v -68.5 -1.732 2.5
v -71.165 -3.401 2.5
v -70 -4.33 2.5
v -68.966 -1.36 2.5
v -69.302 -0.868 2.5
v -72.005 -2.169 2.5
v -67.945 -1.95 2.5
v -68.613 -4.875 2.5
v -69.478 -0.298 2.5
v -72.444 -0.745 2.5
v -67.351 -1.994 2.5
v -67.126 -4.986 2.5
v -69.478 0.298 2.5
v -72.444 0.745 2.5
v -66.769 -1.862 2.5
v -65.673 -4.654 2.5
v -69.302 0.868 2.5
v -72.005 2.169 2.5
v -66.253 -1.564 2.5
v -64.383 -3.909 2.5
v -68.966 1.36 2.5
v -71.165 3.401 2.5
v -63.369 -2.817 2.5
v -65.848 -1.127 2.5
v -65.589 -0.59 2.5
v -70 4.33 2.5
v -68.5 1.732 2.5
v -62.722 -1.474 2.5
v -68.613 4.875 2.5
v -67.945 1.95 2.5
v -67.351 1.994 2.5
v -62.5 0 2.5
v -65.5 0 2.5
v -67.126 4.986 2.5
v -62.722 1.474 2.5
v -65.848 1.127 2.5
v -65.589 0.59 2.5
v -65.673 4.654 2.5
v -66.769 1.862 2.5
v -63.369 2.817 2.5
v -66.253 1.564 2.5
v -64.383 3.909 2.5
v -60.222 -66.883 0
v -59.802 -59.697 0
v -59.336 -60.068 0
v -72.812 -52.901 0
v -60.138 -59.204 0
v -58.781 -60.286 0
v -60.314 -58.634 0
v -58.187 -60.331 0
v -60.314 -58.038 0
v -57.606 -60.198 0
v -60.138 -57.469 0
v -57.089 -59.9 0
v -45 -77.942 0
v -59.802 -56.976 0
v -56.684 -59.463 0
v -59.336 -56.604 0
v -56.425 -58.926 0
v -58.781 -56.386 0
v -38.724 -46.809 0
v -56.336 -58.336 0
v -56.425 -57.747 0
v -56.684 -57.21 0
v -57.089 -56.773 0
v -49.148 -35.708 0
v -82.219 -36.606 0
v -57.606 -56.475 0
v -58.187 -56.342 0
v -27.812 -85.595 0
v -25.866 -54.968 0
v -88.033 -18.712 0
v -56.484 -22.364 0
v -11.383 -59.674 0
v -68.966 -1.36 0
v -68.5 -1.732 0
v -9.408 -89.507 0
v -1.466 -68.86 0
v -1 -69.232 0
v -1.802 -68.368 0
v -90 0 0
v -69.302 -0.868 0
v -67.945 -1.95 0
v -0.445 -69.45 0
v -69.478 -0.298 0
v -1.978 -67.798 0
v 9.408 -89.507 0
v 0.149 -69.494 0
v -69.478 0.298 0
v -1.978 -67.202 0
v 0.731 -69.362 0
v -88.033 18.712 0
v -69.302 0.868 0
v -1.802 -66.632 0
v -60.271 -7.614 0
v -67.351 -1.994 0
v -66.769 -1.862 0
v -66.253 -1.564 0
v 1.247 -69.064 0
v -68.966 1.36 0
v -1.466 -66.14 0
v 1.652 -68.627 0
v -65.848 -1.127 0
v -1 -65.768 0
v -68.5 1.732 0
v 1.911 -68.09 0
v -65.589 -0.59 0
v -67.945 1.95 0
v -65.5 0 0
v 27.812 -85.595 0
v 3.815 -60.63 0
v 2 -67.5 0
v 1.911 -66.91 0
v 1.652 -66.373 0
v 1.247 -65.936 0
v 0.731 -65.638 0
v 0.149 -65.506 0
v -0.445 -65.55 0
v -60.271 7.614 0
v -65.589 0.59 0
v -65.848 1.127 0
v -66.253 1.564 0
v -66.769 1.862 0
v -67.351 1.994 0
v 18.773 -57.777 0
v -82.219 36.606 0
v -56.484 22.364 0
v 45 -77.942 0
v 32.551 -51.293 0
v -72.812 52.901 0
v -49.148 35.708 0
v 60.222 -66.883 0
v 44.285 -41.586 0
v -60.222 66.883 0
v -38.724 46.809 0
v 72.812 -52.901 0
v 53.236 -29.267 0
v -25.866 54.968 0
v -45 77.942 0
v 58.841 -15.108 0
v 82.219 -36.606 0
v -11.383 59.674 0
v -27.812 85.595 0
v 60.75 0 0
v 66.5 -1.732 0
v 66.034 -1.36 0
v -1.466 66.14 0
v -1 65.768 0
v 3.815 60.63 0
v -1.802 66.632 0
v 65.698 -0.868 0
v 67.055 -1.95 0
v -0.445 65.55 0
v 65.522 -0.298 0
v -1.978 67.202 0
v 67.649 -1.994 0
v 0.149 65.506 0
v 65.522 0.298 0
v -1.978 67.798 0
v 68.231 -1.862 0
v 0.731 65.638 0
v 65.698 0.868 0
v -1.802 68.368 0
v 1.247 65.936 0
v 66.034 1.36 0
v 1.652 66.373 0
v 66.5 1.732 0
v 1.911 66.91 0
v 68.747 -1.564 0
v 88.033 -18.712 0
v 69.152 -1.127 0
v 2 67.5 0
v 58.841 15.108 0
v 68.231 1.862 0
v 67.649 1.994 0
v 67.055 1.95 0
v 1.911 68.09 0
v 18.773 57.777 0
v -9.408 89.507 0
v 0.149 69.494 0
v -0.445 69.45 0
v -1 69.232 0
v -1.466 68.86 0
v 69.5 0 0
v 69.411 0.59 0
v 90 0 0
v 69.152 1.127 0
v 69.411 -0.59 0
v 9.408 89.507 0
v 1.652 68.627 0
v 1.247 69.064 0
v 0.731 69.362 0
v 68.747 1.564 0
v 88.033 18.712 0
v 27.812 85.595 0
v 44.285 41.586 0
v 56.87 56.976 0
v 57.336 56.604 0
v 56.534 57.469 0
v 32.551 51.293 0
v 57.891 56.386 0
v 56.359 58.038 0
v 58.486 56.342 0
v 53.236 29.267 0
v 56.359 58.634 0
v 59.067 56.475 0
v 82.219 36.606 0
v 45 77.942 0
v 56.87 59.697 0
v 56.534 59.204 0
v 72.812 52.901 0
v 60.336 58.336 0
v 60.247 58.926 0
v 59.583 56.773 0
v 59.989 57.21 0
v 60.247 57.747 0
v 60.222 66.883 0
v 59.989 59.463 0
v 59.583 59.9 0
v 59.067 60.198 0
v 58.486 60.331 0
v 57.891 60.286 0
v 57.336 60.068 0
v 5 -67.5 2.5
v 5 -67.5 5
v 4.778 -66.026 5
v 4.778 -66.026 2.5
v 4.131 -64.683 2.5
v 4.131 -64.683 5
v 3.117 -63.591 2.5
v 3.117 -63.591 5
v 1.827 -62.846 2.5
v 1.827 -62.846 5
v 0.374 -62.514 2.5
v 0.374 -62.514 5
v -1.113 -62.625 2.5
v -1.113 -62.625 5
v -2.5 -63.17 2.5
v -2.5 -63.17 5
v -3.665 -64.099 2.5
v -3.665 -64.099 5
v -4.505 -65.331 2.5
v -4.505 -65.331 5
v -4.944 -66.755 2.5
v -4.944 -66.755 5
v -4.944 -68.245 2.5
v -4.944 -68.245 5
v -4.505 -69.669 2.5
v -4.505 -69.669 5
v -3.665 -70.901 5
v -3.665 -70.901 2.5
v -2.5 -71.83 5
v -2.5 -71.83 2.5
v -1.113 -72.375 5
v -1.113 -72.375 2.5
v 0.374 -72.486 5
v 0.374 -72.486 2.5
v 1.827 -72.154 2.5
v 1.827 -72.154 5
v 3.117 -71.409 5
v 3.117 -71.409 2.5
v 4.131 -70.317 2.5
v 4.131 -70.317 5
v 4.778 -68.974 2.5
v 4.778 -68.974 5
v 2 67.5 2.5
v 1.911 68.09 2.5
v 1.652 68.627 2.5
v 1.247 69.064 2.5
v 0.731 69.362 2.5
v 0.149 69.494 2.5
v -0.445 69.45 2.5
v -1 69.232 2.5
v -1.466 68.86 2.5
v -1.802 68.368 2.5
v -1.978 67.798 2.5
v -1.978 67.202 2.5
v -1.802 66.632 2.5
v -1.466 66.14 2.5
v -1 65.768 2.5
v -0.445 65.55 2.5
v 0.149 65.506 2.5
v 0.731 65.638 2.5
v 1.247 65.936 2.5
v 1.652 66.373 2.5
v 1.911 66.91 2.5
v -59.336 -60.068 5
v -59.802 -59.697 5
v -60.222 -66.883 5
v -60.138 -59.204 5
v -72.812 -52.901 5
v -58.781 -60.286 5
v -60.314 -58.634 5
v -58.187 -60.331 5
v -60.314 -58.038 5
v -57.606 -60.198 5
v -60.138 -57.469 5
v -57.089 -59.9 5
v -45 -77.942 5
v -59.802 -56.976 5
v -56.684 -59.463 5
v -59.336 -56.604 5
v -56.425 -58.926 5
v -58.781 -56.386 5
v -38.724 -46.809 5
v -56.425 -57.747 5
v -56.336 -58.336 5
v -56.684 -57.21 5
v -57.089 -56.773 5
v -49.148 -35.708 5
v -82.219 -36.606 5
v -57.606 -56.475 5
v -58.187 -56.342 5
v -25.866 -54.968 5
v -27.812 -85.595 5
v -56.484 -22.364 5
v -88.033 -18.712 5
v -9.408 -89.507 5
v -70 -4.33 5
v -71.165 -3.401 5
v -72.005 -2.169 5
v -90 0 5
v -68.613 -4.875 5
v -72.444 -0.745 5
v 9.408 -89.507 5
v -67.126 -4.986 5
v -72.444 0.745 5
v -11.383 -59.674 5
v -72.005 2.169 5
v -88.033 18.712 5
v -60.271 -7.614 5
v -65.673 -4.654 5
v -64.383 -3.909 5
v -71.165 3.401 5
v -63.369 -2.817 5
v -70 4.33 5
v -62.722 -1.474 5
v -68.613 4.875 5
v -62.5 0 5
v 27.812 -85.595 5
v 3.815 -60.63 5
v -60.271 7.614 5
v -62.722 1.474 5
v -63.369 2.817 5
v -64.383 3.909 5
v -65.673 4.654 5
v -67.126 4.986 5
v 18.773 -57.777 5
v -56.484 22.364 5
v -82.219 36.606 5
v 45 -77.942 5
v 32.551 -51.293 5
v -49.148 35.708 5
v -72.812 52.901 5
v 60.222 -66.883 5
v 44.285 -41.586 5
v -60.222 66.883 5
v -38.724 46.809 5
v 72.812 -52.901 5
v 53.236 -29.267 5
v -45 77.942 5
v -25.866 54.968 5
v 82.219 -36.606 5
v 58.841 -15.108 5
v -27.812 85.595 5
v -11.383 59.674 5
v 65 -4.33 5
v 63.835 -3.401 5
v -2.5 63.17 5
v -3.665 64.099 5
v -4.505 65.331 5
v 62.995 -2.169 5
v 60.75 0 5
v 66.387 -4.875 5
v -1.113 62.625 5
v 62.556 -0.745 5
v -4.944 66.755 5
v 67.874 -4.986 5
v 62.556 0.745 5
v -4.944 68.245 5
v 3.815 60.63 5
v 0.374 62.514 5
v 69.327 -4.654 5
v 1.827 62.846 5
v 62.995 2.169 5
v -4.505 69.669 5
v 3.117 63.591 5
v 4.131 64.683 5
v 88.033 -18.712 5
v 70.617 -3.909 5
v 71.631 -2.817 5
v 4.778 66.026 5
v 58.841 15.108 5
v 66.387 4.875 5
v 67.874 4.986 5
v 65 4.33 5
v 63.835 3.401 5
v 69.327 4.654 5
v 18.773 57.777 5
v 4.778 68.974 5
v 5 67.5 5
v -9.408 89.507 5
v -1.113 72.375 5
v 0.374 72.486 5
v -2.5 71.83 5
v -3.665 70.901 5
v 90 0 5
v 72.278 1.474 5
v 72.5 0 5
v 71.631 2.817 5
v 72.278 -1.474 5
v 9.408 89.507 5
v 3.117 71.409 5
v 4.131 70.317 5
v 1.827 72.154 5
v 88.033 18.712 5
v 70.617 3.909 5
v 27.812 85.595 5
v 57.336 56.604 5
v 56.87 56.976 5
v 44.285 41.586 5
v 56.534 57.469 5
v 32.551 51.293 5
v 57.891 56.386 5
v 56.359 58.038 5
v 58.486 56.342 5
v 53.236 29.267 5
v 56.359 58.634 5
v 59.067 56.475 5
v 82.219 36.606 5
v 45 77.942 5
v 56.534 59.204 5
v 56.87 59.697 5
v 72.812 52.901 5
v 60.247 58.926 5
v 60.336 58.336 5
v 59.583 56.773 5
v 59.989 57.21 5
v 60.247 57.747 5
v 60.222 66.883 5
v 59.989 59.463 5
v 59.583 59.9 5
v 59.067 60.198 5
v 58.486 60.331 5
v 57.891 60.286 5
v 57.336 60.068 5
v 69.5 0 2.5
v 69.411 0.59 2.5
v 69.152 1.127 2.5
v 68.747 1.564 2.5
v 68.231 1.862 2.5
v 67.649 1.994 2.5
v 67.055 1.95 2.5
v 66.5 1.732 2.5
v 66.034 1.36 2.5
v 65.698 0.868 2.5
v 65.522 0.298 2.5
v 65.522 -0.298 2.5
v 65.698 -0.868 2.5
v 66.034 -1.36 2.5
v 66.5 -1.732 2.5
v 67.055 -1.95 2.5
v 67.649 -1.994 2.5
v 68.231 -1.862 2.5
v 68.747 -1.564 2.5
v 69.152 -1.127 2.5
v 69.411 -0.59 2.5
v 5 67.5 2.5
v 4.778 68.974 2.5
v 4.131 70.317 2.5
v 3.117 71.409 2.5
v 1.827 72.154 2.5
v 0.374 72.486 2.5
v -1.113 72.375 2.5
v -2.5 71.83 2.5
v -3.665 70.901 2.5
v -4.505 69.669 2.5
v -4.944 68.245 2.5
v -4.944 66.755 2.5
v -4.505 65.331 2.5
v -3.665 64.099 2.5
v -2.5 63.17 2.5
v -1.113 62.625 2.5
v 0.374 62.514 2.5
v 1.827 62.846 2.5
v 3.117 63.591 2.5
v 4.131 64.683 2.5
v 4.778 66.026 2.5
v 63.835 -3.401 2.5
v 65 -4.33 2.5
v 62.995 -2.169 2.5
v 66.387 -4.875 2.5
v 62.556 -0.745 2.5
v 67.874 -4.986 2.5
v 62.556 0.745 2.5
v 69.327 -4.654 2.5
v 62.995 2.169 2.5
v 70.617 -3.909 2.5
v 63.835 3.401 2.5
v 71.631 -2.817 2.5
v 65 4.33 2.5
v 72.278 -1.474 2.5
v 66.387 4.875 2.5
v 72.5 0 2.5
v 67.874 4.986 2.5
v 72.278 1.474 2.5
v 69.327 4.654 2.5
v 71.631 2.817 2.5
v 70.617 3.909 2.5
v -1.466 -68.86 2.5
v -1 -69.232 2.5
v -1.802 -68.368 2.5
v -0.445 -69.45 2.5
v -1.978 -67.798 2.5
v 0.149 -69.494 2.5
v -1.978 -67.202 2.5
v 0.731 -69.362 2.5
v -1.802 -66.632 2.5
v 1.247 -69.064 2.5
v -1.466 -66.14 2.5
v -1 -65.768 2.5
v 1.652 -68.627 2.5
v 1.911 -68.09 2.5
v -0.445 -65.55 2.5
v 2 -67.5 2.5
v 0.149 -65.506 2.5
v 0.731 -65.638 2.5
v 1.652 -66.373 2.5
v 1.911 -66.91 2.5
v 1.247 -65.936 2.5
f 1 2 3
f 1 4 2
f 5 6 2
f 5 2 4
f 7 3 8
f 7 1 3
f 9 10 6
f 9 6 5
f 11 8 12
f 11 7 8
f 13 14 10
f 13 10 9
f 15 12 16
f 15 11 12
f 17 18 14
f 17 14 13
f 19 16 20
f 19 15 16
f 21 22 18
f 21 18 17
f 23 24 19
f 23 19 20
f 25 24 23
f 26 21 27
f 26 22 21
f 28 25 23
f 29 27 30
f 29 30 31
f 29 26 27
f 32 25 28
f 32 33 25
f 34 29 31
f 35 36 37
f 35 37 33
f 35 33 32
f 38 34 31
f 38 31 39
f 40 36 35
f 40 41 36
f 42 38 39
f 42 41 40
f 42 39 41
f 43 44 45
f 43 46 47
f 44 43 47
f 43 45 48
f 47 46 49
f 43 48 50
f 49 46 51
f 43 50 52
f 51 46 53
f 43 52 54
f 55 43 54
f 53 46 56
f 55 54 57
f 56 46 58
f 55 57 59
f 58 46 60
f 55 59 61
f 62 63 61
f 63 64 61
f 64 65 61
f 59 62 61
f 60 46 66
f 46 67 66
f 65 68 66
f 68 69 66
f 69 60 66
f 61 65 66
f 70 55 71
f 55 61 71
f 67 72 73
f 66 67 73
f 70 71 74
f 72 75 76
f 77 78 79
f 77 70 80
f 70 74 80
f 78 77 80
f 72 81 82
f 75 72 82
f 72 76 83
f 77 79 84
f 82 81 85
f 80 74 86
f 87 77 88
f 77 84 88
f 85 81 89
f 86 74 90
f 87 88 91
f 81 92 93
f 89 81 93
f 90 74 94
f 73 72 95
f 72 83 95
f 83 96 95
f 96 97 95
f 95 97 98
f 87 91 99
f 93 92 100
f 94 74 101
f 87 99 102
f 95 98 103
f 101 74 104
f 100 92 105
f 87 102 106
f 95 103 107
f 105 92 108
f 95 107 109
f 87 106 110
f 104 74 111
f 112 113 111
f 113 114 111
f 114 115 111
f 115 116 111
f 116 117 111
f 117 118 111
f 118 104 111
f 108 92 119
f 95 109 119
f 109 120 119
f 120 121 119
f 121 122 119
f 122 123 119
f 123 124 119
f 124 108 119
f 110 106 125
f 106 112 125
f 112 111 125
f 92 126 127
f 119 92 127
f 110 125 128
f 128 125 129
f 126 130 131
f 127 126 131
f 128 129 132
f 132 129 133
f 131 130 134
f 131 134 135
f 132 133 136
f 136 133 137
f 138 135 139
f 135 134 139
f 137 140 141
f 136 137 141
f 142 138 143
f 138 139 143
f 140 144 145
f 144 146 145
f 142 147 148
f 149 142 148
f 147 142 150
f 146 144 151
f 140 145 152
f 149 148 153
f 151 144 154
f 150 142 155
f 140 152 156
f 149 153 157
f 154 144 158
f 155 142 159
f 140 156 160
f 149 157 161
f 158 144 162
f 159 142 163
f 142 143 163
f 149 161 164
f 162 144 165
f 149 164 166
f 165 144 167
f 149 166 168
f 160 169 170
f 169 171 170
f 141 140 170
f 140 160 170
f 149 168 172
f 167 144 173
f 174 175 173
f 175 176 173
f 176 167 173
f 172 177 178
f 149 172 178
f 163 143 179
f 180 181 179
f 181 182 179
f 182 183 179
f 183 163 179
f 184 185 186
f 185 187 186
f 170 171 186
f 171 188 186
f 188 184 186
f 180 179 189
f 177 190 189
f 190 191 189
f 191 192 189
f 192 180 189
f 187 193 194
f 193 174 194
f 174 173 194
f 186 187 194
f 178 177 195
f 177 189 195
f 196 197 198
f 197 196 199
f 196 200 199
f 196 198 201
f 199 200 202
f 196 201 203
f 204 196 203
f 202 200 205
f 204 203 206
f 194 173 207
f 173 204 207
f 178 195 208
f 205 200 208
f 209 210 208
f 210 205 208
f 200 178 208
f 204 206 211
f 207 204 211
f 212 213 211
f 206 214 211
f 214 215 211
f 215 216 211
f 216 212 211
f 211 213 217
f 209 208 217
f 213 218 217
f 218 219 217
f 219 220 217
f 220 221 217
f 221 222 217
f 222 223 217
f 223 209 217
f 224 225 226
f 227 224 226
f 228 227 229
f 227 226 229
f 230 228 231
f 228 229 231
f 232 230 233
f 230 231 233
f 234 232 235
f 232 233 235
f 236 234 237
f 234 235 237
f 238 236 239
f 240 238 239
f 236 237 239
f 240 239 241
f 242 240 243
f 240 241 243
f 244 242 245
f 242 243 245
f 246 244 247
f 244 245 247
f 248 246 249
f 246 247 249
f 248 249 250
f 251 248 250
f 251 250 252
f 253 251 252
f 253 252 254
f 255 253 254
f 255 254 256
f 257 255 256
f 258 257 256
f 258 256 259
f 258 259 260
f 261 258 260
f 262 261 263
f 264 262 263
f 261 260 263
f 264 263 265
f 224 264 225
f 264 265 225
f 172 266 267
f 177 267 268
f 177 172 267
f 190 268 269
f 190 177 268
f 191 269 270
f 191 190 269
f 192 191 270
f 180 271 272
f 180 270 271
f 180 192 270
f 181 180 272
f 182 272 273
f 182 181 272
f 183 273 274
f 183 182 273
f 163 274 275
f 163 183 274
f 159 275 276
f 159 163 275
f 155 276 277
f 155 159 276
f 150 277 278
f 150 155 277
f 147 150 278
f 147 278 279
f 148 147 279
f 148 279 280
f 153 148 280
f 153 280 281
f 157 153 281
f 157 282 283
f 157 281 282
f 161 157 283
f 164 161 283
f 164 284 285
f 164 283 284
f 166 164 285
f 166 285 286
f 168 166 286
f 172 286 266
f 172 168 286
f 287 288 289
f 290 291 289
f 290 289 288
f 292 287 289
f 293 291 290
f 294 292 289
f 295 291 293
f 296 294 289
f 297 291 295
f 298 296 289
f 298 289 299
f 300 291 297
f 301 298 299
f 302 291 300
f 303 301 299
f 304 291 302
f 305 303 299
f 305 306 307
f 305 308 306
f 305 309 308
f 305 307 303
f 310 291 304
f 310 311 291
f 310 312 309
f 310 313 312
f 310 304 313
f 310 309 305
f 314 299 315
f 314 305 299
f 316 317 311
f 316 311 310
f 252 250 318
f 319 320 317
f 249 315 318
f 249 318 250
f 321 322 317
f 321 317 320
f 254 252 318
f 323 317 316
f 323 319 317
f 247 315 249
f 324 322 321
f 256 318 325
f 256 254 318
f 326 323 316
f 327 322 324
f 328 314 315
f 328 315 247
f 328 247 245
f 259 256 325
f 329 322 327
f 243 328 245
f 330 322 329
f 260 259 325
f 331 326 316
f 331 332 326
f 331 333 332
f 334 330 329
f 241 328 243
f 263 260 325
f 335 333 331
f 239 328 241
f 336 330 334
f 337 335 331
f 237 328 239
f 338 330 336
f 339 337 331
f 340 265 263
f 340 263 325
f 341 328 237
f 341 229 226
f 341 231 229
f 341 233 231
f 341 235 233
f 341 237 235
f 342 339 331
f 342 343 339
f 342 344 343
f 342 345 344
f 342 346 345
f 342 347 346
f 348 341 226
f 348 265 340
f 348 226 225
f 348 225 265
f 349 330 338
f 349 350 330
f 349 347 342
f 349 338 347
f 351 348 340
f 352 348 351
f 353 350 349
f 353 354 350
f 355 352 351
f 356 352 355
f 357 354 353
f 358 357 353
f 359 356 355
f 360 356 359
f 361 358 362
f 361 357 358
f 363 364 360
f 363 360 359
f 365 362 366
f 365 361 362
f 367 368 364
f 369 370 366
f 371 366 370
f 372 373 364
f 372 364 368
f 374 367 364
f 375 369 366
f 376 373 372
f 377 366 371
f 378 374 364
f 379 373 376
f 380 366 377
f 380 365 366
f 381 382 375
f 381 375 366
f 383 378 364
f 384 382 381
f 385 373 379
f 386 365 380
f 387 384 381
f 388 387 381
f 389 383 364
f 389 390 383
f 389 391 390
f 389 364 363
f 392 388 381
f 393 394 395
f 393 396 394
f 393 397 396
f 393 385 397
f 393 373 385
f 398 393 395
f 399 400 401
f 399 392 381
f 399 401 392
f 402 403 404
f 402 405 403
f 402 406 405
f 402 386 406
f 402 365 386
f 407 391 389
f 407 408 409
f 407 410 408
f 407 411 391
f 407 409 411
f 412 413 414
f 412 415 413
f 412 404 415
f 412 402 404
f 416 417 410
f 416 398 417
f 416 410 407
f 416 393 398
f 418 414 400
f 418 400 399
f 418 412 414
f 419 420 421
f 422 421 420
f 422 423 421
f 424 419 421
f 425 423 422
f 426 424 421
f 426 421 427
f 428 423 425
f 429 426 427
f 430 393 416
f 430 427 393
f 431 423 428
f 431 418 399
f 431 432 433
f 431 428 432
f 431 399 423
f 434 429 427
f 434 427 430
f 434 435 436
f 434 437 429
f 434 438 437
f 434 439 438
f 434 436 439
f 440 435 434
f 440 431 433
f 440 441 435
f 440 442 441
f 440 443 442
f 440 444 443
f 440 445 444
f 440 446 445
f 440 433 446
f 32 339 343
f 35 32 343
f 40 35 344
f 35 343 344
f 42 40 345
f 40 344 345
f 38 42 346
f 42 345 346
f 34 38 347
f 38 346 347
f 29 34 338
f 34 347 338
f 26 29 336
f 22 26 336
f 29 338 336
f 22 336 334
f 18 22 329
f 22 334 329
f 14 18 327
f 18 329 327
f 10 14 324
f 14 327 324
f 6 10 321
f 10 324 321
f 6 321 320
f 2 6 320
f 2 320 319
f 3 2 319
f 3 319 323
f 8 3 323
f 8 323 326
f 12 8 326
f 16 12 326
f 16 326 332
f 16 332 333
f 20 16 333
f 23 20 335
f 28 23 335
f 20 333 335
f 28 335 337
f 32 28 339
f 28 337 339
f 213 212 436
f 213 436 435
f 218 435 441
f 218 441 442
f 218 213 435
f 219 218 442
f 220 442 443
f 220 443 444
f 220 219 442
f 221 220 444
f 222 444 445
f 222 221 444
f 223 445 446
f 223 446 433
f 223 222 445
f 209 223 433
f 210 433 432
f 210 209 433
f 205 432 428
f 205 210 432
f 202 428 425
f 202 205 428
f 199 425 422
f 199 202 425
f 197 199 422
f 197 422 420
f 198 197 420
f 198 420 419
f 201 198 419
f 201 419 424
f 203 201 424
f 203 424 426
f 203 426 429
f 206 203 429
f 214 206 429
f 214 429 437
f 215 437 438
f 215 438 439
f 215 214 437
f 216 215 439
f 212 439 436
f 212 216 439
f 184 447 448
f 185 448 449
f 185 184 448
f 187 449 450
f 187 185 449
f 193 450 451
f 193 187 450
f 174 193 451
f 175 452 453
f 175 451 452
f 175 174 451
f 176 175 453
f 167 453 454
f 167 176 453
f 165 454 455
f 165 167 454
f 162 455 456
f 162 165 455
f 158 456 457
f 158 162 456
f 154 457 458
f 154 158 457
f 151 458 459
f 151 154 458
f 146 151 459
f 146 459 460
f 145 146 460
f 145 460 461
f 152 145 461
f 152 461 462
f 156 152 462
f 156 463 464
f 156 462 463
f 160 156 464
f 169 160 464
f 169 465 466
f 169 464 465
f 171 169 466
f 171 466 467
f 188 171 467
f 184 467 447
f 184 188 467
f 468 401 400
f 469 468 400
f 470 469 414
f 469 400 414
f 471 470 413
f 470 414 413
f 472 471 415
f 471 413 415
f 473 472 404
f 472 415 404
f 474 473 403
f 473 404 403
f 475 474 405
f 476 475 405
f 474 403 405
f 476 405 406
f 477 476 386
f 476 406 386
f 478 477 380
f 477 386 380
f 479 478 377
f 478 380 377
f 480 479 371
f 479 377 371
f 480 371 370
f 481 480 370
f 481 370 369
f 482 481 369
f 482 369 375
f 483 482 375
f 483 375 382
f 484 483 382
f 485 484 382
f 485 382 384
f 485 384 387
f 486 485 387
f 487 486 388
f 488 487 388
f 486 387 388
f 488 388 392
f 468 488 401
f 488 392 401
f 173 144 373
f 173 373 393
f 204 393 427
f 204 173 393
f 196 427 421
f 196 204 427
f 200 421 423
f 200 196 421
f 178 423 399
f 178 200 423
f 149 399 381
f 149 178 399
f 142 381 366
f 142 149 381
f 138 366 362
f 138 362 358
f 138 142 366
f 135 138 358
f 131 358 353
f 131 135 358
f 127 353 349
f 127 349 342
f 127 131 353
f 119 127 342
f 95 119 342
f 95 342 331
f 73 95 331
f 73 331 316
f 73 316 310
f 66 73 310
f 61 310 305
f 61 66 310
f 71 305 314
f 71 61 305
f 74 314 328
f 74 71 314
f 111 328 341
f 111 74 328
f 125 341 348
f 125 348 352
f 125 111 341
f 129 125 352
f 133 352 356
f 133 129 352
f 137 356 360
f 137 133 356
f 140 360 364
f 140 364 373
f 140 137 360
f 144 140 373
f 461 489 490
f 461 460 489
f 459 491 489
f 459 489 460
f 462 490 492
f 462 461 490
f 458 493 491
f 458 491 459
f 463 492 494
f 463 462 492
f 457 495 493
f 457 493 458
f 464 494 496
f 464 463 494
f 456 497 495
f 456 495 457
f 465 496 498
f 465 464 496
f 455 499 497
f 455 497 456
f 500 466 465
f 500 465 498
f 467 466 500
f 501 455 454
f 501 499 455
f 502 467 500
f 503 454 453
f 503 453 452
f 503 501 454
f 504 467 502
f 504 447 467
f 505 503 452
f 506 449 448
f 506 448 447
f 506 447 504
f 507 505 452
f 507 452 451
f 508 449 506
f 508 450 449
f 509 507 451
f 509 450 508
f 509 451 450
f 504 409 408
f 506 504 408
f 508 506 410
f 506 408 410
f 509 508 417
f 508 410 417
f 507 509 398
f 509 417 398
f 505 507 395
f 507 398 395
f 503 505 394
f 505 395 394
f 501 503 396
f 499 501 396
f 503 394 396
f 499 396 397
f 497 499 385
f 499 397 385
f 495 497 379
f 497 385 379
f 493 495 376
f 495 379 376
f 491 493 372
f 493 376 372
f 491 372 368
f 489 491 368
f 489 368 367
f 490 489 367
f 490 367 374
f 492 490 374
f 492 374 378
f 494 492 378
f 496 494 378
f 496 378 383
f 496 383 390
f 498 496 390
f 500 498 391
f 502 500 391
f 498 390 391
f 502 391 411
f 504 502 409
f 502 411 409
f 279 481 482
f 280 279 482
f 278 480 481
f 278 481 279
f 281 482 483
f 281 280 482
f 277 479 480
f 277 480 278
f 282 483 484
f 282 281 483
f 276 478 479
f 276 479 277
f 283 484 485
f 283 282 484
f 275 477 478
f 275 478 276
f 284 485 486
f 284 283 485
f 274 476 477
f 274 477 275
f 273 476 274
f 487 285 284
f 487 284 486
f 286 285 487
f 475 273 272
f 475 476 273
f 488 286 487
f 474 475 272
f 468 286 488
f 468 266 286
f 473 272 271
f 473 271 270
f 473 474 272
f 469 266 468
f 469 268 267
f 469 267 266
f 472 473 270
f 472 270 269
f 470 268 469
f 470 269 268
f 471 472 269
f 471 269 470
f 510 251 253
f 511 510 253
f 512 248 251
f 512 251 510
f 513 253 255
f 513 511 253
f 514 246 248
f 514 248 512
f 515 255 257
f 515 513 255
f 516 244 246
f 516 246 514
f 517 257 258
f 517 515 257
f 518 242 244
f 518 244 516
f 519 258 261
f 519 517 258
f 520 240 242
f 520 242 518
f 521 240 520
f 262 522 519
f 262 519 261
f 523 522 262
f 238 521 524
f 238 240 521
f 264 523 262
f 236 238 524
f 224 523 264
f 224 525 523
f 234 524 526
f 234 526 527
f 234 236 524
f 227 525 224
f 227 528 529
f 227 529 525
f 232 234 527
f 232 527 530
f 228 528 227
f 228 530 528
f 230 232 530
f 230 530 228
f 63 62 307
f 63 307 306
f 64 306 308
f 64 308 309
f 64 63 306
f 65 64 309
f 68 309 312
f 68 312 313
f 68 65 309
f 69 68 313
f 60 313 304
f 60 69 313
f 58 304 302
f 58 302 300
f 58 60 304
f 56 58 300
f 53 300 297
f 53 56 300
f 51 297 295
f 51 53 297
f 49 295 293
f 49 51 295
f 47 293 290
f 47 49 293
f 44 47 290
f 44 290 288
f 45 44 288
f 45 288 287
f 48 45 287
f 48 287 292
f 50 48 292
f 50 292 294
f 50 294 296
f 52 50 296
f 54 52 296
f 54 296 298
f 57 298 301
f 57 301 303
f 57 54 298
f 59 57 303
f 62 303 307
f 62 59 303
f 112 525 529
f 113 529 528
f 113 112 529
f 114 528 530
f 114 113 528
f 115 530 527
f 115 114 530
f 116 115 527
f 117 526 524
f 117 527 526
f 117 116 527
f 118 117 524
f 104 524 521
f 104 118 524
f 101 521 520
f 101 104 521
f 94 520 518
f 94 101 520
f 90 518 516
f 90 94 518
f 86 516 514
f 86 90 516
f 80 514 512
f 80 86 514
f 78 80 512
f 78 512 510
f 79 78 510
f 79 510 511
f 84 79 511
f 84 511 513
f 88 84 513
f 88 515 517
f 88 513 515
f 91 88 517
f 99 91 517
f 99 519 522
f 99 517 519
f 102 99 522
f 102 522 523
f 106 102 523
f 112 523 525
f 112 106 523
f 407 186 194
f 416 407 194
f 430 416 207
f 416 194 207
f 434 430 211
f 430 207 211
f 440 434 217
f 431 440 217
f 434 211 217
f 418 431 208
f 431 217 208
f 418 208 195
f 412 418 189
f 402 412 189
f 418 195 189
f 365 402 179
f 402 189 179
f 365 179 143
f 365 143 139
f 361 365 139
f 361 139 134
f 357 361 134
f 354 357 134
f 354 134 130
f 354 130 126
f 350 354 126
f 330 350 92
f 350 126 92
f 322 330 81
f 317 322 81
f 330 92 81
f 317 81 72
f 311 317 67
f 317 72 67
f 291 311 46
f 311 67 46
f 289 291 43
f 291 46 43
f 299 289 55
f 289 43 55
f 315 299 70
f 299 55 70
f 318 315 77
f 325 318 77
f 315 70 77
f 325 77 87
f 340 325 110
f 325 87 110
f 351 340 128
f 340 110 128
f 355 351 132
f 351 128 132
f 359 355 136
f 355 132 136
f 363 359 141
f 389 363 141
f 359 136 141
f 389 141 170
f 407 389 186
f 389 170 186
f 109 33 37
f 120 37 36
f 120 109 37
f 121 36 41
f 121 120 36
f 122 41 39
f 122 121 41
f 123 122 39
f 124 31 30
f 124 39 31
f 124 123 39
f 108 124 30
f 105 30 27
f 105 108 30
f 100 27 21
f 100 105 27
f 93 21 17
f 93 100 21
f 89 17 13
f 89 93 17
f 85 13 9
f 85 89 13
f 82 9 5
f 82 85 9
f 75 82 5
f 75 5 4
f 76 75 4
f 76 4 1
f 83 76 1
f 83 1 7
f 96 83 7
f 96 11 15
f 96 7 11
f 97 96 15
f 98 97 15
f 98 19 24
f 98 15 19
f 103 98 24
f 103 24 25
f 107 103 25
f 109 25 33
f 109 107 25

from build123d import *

# Parameters (mm, degrees)
SKETCH_R     = 90
SKETCH_R_2   = 60.75
SKETCH_R_3   = 2
PAD_DEPTH    = 5
SKETCH001_R  = 5
POCKET_DEPTH = 2.5


with BuildPart() as part:
    # Sketch → Pad (new body)
    with BuildSketch(Plane.XY):
        Circle(SKETCH_R)
        Circle(SKETCH_R_2, mode=Mode.SUBTRACT)
        with Locations((0, 67.5)):
            Circle(SKETCH_R_3, mode=Mode.SUBTRACT)
        with Locations((67.5, 0)):
            Circle(SKETCH_R_3, mode=Mode.SUBTRACT)
        with Locations((0, -67.5)):
            Circle(SKETCH_R_3, mode=Mode.SUBTRACT)
        with Locations((-67.5, 0)):
            Circle(SKETCH_R_3, mode=Mode.SUBTRACT)
        with Locations((-58.336309, -58.336309)):
            Circle(SKETCH_R_3, mode=Mode.SUBTRACT)
        with Locations((58.336309, 58.336309)):
            Circle(SKETCH_R_3, mode=Mode.SUBTRACT)
    extrude(amount=PAD_DEPTH)

    # Sketch001 (on Face10 of Pad) → Pocket (cut)
    with BuildSketch(Plane.XY.offset(5)):
        with Locations((67.5, 0)):
            Circle(SKETCH001_R)
        with Locations((0, 67.5)):
            Circle(SKETCH001_R)
        with Locations((-67.5, 0)):
            Circle(SKETCH001_R)
        with Locations((0, -67.5)):
            Circle(SKETCH001_R)
    extrude(amount=-POCKET_DEPTH, mode=Mode.SUBTRACT)


solid = part.part
